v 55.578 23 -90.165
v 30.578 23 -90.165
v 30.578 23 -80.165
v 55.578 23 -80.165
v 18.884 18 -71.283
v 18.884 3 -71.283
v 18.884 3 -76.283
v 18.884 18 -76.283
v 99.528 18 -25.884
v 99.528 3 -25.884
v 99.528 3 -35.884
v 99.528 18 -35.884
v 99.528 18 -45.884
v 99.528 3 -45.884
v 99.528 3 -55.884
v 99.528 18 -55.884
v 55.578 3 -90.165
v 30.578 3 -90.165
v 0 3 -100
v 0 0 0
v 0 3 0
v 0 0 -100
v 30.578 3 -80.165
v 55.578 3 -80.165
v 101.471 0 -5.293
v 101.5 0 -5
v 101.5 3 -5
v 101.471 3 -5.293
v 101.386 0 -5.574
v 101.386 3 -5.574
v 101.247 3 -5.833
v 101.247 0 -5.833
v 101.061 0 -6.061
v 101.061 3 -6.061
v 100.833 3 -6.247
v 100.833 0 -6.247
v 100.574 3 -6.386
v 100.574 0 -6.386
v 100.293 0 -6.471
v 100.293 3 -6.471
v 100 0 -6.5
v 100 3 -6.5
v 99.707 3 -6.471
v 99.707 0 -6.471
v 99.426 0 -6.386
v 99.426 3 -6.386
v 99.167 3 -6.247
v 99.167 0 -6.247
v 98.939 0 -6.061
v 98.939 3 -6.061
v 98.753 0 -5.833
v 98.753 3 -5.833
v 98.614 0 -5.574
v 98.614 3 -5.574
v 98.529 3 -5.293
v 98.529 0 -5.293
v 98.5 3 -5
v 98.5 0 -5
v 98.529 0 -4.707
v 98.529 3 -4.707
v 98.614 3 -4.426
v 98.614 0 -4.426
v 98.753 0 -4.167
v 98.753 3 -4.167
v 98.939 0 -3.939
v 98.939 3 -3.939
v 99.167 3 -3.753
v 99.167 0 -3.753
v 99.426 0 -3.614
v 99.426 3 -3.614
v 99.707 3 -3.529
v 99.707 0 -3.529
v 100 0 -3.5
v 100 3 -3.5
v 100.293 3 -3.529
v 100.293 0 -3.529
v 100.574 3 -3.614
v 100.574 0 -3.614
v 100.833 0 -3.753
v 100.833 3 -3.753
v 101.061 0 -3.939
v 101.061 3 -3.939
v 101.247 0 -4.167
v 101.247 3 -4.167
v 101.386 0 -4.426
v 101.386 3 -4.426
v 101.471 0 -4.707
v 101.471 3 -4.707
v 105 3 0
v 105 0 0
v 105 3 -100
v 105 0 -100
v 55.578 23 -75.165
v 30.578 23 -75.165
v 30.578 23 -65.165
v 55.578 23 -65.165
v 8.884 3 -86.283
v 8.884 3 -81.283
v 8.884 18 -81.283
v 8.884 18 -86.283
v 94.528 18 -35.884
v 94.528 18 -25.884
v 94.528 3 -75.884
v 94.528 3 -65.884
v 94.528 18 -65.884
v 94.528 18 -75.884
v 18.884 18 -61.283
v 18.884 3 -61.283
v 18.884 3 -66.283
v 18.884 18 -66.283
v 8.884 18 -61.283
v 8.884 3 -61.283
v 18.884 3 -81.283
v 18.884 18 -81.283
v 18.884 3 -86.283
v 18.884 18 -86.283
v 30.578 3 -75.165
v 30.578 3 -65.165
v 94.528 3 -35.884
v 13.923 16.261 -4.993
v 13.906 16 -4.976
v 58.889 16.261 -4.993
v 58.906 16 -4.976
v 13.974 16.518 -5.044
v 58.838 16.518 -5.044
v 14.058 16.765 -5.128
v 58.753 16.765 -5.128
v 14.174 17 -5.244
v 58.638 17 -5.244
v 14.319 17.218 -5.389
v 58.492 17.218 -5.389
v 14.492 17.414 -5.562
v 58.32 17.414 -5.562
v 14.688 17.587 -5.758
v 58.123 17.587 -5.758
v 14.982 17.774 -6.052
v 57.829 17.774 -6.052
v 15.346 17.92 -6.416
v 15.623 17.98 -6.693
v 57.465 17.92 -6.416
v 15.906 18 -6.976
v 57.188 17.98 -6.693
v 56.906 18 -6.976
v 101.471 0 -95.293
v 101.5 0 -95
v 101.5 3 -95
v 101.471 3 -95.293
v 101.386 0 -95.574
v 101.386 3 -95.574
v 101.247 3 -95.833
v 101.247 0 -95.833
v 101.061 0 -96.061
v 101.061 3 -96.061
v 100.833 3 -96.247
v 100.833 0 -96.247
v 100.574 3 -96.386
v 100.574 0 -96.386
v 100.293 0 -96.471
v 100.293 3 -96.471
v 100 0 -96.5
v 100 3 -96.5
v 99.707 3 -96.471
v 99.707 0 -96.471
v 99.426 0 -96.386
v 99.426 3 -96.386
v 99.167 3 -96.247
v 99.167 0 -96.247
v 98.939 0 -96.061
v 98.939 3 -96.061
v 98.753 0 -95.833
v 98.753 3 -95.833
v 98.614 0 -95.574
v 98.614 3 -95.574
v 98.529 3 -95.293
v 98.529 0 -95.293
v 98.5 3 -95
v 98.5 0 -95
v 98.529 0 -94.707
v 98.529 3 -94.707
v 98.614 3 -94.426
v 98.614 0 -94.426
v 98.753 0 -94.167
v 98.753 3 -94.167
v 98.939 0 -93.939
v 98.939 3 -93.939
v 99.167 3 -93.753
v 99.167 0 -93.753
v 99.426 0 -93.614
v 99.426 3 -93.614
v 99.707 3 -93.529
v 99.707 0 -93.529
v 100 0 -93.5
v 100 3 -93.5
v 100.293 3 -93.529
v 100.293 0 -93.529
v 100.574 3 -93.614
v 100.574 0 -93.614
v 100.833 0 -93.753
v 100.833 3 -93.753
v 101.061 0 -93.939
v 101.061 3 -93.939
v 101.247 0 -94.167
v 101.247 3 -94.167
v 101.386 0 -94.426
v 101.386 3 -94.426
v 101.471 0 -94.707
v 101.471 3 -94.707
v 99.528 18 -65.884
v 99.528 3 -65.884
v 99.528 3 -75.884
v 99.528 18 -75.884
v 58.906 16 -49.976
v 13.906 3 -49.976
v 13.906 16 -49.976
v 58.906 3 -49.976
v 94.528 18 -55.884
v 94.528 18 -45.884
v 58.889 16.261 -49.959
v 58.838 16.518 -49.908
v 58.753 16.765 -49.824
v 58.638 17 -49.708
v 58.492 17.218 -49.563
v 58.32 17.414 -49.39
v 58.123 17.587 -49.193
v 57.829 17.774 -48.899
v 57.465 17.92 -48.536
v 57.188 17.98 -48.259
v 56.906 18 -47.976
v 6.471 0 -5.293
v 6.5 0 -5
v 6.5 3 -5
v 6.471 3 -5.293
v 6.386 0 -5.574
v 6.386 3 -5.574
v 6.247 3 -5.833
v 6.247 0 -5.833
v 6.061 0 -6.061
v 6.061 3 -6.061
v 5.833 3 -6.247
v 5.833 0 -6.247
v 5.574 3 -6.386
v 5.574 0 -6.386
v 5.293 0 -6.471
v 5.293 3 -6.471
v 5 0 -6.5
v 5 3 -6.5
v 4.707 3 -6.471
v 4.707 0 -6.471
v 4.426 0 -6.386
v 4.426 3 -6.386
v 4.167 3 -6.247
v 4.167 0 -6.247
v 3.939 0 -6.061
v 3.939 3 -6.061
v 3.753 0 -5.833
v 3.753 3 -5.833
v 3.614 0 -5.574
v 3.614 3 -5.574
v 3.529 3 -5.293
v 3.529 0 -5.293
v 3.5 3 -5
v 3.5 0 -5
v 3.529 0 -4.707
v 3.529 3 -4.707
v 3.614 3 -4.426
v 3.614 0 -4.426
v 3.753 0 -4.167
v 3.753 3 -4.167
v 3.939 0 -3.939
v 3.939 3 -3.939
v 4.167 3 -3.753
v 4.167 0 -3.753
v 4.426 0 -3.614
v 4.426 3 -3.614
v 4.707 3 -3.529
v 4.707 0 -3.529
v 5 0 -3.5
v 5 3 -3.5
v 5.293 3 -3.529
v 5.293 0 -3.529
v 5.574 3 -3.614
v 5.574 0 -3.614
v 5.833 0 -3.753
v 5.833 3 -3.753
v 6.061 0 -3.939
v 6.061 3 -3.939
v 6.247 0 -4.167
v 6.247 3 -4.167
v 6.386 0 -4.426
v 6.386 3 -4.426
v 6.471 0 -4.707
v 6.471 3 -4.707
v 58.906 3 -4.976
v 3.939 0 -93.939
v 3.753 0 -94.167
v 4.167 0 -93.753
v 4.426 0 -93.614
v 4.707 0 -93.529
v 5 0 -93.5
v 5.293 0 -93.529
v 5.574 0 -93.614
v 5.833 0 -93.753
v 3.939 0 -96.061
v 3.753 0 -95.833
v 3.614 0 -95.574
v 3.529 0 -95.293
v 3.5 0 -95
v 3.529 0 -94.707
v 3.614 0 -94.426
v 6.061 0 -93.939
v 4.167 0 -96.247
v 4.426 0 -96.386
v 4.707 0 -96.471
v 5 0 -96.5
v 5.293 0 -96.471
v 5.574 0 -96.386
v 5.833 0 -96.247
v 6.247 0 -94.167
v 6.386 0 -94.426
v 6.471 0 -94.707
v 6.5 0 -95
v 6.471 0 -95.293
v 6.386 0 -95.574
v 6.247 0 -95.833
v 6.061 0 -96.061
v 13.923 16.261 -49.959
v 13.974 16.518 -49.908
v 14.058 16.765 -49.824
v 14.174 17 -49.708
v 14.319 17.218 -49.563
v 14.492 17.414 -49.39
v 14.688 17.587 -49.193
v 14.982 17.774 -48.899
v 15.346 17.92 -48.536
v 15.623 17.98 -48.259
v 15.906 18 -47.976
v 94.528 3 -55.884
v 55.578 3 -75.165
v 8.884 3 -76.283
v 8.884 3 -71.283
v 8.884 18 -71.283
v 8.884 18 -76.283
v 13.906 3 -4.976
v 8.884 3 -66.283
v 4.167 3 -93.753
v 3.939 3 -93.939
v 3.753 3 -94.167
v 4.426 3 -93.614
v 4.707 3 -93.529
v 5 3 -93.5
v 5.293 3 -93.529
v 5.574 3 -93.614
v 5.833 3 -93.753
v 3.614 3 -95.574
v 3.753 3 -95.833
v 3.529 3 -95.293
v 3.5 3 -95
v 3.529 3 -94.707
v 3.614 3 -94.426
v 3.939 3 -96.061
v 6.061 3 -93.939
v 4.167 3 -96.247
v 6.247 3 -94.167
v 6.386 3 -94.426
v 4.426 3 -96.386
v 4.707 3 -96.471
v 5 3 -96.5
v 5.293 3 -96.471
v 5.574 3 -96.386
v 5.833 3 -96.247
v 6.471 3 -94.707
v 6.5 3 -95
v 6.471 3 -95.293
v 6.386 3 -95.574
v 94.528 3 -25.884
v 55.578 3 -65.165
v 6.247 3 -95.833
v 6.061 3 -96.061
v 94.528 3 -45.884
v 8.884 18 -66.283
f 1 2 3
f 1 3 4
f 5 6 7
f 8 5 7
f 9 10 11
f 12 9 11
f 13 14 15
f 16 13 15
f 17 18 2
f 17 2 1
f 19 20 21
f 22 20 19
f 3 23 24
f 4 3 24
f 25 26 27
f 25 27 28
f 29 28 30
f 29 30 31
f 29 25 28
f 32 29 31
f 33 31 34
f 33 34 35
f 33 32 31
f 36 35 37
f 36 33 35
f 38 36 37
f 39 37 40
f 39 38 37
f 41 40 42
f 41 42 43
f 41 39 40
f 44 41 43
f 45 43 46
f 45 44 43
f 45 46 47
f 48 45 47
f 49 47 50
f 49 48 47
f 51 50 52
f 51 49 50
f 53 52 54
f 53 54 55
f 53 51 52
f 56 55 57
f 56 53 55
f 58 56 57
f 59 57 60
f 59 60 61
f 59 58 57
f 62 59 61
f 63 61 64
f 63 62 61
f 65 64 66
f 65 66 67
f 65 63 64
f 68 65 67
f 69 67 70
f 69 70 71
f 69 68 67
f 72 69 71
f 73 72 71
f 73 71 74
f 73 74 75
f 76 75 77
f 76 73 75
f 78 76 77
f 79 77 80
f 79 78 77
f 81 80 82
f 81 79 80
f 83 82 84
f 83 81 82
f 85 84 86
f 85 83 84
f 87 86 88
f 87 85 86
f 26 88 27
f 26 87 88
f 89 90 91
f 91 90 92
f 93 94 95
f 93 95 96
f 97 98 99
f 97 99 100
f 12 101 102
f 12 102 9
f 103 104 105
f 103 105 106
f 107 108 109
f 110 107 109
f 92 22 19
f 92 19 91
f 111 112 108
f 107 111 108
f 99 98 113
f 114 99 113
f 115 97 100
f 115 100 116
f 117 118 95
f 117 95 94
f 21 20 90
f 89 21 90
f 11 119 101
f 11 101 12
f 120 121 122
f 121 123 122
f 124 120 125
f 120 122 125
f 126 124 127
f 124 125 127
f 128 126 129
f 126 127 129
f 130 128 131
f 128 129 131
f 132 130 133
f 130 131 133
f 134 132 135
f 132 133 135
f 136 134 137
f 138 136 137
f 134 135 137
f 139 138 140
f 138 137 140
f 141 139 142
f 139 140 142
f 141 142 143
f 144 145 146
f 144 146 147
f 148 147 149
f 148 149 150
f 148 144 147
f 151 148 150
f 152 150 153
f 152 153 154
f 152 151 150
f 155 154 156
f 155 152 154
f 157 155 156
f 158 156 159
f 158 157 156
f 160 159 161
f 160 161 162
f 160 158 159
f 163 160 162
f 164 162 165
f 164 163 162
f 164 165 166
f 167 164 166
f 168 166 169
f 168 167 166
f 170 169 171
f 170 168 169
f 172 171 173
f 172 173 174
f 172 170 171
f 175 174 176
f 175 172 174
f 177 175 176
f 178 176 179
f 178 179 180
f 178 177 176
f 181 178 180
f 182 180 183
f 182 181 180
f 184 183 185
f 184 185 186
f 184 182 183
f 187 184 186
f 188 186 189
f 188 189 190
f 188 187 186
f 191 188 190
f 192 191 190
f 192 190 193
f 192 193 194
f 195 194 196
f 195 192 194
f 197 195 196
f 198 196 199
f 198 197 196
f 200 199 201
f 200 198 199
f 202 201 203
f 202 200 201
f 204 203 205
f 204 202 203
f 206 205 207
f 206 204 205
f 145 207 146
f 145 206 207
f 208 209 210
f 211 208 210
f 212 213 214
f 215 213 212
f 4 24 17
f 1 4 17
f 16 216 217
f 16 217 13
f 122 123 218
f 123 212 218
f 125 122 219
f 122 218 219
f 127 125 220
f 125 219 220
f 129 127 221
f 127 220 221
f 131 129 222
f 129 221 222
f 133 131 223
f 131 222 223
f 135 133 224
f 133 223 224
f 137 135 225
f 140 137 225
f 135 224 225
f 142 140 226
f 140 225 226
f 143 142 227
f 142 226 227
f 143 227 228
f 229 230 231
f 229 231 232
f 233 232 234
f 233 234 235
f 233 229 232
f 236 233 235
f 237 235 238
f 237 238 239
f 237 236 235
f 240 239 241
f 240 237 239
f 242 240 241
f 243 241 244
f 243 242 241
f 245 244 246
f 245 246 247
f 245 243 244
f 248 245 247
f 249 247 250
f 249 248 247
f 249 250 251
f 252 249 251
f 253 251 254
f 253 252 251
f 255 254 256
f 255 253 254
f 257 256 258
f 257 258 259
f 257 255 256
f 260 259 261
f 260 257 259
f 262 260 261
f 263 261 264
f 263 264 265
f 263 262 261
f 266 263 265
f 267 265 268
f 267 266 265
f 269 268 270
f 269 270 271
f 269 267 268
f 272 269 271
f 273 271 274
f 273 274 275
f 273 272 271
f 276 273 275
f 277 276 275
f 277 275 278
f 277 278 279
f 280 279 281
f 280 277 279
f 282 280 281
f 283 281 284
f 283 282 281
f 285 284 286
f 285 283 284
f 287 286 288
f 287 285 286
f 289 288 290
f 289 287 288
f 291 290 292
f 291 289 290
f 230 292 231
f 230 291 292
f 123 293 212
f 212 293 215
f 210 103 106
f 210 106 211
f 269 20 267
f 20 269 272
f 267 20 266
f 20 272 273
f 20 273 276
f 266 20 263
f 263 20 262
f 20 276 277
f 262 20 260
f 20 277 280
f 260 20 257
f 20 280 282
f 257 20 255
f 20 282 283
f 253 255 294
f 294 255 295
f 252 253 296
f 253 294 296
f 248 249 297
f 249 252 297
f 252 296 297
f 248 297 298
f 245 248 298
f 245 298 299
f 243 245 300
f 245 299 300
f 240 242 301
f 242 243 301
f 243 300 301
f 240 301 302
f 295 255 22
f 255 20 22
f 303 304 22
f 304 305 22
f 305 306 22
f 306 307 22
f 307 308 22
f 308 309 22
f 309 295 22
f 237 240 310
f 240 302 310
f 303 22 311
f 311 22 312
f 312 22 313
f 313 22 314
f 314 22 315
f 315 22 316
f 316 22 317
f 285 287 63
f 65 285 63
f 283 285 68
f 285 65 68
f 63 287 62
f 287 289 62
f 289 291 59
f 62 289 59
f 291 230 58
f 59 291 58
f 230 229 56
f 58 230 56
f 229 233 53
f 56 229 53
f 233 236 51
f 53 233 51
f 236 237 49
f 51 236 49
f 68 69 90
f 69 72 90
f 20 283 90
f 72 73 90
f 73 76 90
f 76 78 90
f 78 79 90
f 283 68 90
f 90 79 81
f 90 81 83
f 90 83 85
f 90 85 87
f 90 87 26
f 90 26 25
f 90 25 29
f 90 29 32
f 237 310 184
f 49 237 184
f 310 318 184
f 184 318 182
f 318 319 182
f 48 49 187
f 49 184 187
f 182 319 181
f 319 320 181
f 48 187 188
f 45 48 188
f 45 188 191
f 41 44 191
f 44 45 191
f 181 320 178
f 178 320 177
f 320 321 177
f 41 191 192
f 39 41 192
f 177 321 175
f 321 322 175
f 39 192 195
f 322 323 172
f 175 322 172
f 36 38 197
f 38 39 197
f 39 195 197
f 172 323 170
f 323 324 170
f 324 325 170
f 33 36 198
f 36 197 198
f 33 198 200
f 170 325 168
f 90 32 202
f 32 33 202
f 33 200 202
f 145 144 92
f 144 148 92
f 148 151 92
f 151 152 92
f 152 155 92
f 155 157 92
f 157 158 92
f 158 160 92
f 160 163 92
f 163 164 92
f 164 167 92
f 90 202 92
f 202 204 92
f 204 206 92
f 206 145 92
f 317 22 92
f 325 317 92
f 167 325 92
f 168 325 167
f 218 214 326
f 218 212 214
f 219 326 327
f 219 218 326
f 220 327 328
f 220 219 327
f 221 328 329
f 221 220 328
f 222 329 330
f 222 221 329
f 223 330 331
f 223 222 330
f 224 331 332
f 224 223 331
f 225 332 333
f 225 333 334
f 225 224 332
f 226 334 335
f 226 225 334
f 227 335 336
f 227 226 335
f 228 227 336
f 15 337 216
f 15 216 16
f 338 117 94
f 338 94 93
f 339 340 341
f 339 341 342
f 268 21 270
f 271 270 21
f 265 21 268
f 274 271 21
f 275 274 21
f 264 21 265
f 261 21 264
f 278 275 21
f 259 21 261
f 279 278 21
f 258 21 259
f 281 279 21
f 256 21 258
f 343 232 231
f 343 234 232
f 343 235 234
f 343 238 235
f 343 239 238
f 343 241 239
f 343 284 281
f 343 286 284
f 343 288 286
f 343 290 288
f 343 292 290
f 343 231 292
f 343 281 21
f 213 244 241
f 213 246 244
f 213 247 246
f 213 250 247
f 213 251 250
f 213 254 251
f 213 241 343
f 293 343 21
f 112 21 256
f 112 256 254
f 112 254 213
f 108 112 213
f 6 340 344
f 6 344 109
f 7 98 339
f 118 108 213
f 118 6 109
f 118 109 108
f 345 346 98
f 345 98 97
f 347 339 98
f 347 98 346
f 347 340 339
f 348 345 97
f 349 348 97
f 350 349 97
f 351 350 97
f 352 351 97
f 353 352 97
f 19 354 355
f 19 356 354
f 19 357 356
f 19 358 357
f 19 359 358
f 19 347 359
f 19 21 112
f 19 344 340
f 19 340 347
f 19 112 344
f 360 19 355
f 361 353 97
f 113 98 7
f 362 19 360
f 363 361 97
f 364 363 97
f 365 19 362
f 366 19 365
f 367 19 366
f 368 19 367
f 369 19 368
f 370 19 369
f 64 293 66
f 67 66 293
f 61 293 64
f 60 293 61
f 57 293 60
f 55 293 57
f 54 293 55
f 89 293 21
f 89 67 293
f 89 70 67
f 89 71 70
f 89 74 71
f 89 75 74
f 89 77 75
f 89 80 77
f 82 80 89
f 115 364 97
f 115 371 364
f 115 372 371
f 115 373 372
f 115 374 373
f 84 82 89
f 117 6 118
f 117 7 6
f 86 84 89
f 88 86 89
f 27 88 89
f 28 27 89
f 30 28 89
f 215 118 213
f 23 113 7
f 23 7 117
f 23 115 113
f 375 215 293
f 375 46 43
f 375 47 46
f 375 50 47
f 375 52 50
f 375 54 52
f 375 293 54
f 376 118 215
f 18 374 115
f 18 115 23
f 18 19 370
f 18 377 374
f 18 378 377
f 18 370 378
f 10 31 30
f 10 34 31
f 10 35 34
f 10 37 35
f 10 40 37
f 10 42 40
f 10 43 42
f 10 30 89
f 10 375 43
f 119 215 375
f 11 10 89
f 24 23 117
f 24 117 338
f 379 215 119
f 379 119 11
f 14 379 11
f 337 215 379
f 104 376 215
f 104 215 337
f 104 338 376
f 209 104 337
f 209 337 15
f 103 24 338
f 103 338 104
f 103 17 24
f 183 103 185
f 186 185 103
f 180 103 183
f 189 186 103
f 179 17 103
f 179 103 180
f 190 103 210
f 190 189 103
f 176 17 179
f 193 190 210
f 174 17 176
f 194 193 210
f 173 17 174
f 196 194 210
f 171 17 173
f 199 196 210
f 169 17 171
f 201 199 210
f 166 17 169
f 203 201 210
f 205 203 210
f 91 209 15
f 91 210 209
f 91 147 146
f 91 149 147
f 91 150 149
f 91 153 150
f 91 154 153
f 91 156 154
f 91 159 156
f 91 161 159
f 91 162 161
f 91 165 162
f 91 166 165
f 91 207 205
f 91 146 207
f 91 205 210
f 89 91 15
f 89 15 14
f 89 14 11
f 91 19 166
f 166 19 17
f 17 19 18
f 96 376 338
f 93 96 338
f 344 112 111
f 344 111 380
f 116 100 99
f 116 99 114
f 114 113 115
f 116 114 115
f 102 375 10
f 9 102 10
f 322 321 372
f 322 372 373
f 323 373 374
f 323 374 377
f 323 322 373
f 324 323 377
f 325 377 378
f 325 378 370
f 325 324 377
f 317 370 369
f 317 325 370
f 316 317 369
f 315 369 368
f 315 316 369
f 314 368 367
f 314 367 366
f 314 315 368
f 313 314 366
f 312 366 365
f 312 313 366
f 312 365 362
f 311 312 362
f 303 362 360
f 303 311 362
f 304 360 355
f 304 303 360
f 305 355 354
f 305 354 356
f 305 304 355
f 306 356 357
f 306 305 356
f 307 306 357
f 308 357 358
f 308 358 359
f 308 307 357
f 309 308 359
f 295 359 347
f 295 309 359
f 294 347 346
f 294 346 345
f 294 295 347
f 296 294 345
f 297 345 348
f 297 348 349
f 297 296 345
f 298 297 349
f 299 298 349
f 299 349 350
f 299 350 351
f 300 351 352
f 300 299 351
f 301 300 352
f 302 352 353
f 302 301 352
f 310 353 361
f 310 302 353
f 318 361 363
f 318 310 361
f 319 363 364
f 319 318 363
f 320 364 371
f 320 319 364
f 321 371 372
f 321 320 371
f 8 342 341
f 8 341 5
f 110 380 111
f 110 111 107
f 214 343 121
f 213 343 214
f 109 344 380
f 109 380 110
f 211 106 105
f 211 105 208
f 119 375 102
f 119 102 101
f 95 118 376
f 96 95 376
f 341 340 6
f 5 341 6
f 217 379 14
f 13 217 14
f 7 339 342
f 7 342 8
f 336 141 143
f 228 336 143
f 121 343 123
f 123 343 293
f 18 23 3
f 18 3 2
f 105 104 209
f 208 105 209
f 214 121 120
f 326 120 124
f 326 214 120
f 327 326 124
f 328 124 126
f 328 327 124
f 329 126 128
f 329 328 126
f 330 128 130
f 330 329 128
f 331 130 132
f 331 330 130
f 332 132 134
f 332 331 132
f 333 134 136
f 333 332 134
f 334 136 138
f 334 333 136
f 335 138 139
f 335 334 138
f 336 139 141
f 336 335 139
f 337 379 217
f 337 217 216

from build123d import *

# Parameters (mm, degrees)
ESQUISSE1_W      = 105
ESQUISSE1_H      = 100
ESQUISSE1_R      = 1.5
EXTRUSION1_DEPTH = 3
ESQUISSE2_W      = 45
ESQUISSE2_H      = 45
EXTRUSION2_DEPTH = 15
CONG_1_R         = 2
ESQUISSE3_W      = 5
ESQUISSE3_H      = 10
ESQUISSE3_W_2    = 10
ESQUISSE3_H_2    = 5
EXTRUSION3_DEPTH = 15
ESQUISSE4_W      = 25
ESQUISSE4_H      = 10
EXTRUSION4_DEPTH = 20


with BuildPart() as part:
    # Esquisse1 → Extrusion1 (new body)
    with BuildSketch(Plane(origin=(0, 0, 0), x_dir=(1, 0, 0), z_dir=(0, 1, 0))):
        with Locations((52.5, 50)):
            Rectangle(ESQUISSE1_W, ESQUISSE1_H)
        with Locations((5, 95)):
            Circle(ESQUISSE1_R, mode=Mode.SUBTRACT)
        with Locations((100, 95)):
            Circle(ESQUISSE1_R, mode=Mode.SUBTRACT)
        with Locations((100, 5)):
            Circle(ESQUISSE1_R, mode=Mode.SUBTRACT)
        with Locations((5, 5)):
            Circle(ESQUISSE1_R, mode=Mode.SUBTRACT)
    extrude(amount=EXTRUSION1_DEPTH)

    # Esquisse2 → Extrusion2 (add)
    with BuildSketch(Plane(origin=(0, 3, 0), x_dir=(1, 0, 0), z_dir=(0, 1, 0))):
        with Locations((36.405733266, 27.475906062)):
            Rectangle(ESQUISSE2_W, ESQUISSE2_H)
    extrude(amount=EXTRUSION2_DEPTH)

    # Congé1
    cong_1_edges = [part.edges().sort_by_distance(p)[0] for p in [
        (13.905733266, 18, -27.475906062),
        (36.405733266, 18, -4.975906062),
        (58.905733266, 18, -27.475906062),
        (36.405733266, 18, -49.975906062),
    ]]
    fillet(cong_1_edges, radius=CONG_1_R)

    # Esquisse3 → Extrusion3 (add)
    with BuildSketch(Plane(origin=(0, 3, 0), x_dir=(1, 0, 0), z_dir=(0, 1, 0))):
        with Locations((97.027568737, 70.884369428)):
            Rectangle(ESQUISSE3_W, ESQUISSE3_H)
        with Locations((13.884436985, 83.782819762)):
            Rectangle(ESQUISSE3_W_2, ESQUISSE3_H_2)
        with Locations((13.884436985, 73.782819762)):
            Rectangle(ESQUISSE3_W_2, ESQUISSE3_H_2)
        with Locations((13.884436985, 63.782819762)):
            Rectangle(ESQUISSE3_W_2, ESQUISSE3_H_2)
        with Locations((97.027568737, 50.884369428)):
            Rectangle(ESQUISSE3_W, ESQUISSE3_H)
        with Locations((97.027568737, 30.884369428)):
            Rectangle(ESQUISSE3_W, ESQUISSE3_H)
    extrude(amount=EXTRUSION3_DEPTH)

    # Esquisse4 → Extrusion4 (add)
    with BuildSketch(Plane(origin=(0, 3, 0), x_dir=(1, 0, 0), z_dir=(0, 1, 0))):
        with Locations((43.077660713, 85.165216912)):
            Rectangle(ESQUISSE4_W, ESQUISSE4_H)
        with Locations((43.077660713, 70.165216912)):
            Rectangle(ESQUISSE4_W, ESQUISSE4_H)
    extrude(amount=EXTRUSION4_DEPTH)


solid = part.part
